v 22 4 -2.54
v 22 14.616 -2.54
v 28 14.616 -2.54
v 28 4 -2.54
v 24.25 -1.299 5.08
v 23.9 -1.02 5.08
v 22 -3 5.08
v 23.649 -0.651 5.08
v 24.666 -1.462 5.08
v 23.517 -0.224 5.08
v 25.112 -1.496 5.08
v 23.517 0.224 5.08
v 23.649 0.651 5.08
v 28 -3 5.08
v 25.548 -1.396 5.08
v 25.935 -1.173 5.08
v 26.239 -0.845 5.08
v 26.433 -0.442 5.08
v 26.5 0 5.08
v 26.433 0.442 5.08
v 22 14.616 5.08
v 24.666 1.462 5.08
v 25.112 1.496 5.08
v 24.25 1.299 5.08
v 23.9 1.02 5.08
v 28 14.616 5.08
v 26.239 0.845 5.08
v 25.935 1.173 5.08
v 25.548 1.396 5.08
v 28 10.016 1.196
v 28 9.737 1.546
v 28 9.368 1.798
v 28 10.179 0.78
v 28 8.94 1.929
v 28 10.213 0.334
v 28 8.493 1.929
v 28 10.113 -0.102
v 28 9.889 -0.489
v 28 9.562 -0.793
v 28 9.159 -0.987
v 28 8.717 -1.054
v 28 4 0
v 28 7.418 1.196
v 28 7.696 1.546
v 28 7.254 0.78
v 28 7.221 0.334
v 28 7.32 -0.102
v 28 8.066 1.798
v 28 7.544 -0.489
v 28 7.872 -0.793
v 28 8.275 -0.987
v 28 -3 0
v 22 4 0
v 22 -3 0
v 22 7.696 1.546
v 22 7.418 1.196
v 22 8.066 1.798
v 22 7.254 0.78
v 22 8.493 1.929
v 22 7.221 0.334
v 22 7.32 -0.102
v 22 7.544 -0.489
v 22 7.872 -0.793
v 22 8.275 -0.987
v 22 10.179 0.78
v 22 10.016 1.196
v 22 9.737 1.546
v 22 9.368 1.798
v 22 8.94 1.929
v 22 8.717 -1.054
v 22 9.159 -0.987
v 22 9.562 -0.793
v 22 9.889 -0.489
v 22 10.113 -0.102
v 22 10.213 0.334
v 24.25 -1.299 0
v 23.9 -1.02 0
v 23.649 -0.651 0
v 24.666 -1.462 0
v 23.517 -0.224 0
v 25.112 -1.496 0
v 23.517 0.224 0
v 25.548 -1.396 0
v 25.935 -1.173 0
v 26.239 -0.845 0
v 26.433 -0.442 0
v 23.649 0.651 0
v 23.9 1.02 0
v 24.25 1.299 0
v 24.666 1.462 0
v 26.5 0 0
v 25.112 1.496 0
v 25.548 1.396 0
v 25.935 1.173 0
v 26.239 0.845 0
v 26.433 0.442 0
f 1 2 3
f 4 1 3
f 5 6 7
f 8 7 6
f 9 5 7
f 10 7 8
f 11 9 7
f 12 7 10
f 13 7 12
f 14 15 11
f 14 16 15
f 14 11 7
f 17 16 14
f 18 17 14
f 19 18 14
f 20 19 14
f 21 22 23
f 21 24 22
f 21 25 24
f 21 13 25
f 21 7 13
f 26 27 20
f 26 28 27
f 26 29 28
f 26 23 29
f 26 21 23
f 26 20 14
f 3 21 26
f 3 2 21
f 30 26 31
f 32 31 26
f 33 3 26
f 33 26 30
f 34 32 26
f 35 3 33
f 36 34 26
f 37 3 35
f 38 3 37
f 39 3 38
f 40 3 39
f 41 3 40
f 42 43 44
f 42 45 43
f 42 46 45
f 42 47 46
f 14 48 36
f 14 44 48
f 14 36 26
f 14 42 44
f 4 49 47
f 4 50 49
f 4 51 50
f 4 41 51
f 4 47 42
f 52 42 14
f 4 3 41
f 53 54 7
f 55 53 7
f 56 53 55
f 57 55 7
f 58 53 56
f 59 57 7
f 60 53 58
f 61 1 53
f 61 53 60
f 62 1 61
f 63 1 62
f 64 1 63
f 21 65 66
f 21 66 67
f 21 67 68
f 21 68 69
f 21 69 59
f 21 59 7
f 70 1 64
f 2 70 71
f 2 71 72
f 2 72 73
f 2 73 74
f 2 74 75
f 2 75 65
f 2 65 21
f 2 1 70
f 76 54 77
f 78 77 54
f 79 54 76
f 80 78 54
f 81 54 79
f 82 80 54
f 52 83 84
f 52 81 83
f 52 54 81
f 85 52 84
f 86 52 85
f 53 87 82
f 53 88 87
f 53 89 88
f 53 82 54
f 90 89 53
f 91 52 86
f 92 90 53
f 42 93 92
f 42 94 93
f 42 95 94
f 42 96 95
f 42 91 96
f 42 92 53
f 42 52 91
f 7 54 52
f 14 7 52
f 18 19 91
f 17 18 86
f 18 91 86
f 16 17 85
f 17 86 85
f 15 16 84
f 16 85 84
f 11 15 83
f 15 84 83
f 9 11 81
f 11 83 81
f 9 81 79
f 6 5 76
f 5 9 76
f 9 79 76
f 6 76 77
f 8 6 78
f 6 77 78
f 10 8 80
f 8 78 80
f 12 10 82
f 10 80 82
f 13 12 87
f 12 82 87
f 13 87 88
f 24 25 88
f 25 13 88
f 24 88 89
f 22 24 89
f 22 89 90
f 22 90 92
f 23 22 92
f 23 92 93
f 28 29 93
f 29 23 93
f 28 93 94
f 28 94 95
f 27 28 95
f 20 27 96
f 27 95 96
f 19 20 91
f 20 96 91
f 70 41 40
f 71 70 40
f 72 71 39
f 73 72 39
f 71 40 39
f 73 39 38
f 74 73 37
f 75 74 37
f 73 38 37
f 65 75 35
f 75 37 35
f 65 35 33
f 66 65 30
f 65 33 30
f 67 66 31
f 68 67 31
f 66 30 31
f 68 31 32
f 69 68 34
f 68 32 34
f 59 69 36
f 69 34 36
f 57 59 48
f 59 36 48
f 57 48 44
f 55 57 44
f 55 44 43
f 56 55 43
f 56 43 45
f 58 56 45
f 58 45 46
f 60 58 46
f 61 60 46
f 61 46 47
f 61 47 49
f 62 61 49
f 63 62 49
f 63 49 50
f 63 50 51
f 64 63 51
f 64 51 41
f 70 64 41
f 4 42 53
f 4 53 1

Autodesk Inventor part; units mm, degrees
ref_plane "YZ Plane" through (0, 0, 0) normal (1, 0, 0) x (0, 1, 0)
ref_plane "XZ Plane" through (0, 0, 0) normal (0, 1, 0) x (-1, 0, 0)
ref_plane "XY Plane" through (0, 0, 0) normal (0, 0, 1) x (1, 0, 0)
sketch "Sketch1" plane through (0, 0, 0) normal (0, 0, 1) x (1, 0, 0)
  circle A0 centre (25, 0) radius 1.5 projected
  line L0 (30, 7.2167) -> (20.6, 7.2167)
  line L1 (30, 10.2167) -> (20.6, 10.2167)
  line L2 (22, -3) -> (28, -3) projected
  line L3 (28, -3) -> (22, -3)
  line L4 (22, -3) -> (22, 14.6155)
  line L5 (22, 14.6155) -> (28, 14.6155)
  line L6 (28, 14.6155) -> (28, -3)
  point P0 (0, 0)
extrude "Extrusion1" add sketch "Sketch1" along normal blind 5.08 and the other way blind 2.54
sketch "Sketch2" plane through (28, -3, 5.08) normal (1, 0, 0) x (0, 0, -1)
  line L0 (5.08, -1) -> (5.08, 7) projected
  circle A0 centre (4.6338, 11.7167) radius 1.5 projected
  line L1 (5.08, 7) -> (7.62, 7)
  line L2 (7.62, 17.6155) -> (7.62, 0) projected
  line L3 (7.62, 7) -> (7.62, 0)
  line L4 (7.62, 0) -> (5.08, 0)
  line L5 (7.62, 0) -> (0, 0) projected
  line L6 (5.08, 0) -> (5.08, 7)
  point P0 (5.08, 3)
extrude "Extrusion2" cut sketch "Sketch2" against normal blind 7.62
properties part number "Base_encoder"
